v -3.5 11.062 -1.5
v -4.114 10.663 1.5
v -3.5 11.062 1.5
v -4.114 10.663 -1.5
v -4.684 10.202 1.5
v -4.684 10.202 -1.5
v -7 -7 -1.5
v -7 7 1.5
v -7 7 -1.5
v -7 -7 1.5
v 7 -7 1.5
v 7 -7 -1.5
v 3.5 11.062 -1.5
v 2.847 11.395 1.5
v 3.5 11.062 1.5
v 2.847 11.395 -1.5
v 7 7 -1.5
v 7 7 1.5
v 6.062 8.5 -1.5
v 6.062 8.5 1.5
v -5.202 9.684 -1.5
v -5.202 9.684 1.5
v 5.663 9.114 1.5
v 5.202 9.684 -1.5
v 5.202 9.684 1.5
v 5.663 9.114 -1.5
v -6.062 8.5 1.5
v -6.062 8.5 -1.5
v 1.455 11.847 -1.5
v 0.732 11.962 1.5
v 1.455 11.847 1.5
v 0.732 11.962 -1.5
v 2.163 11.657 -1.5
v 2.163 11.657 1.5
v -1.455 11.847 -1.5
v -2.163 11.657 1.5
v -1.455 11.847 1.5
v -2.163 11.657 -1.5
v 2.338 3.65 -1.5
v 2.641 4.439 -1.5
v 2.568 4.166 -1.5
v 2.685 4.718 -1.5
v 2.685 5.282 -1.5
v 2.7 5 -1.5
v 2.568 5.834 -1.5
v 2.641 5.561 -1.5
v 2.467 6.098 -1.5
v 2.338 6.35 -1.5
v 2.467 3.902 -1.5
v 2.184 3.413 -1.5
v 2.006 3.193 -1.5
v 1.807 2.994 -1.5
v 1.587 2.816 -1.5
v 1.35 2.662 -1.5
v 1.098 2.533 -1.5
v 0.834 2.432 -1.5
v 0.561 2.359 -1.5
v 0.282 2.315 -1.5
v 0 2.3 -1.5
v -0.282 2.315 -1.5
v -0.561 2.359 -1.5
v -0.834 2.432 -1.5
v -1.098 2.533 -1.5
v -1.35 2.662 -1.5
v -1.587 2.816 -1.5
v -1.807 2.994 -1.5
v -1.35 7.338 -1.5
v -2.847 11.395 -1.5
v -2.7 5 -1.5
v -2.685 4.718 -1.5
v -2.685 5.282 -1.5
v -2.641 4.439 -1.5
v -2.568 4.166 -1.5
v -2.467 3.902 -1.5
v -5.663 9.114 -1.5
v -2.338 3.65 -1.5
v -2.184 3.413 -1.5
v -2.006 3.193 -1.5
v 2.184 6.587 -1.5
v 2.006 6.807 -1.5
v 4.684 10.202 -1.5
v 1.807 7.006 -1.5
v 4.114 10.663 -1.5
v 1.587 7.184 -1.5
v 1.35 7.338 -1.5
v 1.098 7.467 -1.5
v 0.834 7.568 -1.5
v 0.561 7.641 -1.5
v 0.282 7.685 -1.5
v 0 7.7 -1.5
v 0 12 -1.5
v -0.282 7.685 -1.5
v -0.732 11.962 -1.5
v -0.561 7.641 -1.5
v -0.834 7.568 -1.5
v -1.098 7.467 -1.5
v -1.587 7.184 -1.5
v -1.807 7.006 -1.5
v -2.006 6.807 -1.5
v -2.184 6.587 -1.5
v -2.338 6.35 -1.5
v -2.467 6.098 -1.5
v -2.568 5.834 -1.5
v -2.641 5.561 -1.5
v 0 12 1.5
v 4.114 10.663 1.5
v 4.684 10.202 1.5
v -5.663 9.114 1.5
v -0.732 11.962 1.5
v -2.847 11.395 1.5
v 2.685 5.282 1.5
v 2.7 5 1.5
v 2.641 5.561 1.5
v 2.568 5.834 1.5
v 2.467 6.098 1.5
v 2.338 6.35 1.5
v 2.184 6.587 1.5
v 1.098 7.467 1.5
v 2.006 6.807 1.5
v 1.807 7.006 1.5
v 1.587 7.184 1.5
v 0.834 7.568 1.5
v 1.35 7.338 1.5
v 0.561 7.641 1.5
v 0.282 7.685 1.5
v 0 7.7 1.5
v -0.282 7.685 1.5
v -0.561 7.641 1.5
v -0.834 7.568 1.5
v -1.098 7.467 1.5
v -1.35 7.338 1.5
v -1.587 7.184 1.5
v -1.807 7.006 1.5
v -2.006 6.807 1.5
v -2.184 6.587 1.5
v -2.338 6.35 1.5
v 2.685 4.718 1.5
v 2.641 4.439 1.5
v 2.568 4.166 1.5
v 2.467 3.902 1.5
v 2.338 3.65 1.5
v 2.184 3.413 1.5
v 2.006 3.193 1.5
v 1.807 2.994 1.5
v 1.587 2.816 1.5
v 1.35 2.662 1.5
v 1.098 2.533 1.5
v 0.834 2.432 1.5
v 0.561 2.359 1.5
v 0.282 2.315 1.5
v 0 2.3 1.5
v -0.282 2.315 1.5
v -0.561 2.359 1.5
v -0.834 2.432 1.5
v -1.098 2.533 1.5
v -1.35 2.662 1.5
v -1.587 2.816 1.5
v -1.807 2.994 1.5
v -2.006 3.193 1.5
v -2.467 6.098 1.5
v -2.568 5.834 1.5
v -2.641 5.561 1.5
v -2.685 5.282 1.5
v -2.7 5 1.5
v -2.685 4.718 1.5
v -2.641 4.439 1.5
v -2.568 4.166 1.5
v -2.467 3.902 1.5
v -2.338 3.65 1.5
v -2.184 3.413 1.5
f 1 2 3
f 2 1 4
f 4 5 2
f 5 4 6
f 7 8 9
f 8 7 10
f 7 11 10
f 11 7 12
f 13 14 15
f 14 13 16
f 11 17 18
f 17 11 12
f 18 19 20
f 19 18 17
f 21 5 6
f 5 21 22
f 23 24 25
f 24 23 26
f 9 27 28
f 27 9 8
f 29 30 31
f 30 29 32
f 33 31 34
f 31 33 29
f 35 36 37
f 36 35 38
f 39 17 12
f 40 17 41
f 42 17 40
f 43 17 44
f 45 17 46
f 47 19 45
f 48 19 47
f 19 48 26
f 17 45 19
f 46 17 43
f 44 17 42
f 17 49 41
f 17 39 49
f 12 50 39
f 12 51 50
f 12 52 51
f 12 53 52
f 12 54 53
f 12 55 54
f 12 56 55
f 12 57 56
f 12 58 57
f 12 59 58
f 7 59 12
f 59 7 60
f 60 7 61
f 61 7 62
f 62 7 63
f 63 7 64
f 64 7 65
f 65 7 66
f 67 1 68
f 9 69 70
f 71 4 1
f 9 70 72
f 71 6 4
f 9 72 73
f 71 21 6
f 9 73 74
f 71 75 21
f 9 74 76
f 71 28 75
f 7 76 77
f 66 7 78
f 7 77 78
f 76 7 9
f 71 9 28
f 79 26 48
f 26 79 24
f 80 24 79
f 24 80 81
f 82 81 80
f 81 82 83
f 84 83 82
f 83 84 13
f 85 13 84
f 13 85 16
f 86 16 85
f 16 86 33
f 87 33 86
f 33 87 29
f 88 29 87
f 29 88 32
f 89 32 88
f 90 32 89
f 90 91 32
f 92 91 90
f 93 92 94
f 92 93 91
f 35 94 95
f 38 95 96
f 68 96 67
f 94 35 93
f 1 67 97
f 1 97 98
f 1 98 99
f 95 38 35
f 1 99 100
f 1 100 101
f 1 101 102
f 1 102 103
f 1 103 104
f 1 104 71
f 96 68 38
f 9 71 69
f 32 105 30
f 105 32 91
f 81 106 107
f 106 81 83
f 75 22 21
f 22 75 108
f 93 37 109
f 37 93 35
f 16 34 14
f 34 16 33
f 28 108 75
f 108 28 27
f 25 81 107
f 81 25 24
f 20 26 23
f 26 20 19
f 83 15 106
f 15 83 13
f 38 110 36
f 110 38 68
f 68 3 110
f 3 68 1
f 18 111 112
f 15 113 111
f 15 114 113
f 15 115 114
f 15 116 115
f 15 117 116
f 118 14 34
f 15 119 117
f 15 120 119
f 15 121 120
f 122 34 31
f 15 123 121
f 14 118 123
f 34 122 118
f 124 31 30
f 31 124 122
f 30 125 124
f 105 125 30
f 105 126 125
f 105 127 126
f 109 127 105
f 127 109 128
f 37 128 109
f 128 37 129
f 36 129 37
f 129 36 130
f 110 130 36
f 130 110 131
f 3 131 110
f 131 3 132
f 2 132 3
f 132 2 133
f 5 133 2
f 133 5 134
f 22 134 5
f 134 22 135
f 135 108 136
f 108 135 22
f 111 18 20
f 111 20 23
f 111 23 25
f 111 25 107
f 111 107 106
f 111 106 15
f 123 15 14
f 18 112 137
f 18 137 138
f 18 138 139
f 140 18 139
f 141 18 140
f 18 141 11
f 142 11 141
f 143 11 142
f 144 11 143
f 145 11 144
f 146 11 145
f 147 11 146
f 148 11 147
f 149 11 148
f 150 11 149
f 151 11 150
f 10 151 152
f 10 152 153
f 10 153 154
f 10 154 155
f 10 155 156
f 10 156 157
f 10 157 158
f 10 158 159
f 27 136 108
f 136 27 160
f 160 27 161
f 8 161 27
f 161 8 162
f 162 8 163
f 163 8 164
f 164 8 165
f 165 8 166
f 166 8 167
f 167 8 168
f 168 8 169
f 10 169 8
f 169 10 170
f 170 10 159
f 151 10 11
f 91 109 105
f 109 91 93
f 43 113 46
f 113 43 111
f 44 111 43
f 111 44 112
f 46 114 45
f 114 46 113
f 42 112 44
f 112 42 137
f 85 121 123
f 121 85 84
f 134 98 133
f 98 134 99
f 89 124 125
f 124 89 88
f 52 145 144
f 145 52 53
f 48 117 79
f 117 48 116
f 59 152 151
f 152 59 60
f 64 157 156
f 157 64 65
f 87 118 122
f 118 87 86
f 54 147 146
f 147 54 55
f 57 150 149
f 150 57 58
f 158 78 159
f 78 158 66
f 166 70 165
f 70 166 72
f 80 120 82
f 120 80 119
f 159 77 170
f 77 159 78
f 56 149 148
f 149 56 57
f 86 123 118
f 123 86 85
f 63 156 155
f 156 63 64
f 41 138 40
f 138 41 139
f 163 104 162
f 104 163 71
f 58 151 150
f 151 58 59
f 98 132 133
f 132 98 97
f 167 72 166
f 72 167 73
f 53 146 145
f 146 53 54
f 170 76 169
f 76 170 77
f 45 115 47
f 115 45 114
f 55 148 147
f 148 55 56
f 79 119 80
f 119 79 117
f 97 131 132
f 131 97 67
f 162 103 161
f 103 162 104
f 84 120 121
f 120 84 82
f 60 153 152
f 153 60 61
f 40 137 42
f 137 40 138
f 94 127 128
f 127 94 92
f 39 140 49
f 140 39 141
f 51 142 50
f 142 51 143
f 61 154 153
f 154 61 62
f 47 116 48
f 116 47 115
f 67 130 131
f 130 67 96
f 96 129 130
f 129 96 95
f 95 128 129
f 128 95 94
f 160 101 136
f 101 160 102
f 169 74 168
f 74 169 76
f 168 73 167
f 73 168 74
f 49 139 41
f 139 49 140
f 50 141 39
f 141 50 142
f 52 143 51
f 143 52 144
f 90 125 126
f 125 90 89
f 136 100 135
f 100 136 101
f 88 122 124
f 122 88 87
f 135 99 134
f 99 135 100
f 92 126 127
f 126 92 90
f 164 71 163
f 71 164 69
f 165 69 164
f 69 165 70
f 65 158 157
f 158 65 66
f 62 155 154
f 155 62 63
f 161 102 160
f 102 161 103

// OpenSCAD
// Single-hole mounting tab.
$fn = 60;
eps = 0.02;
tab_w = 14;
tab_h = 24;
tab_t = 3;
hole_d = 5.4;
difference() {
    hull() {
        translate([0, 0, 0]) cube([tab_w, tab_w, tab_t], center = true);
        translate([0, tab_h / 2 - tab_w / 2, 0]) cylinder(d = tab_w, h = tab_t, center = true);
    }
    translate([0, tab_h / 2 - tab_w / 2, -tab_t / 2 - eps]) cylinder(d = hole_d, h = tab_t + 2 * eps);
}
